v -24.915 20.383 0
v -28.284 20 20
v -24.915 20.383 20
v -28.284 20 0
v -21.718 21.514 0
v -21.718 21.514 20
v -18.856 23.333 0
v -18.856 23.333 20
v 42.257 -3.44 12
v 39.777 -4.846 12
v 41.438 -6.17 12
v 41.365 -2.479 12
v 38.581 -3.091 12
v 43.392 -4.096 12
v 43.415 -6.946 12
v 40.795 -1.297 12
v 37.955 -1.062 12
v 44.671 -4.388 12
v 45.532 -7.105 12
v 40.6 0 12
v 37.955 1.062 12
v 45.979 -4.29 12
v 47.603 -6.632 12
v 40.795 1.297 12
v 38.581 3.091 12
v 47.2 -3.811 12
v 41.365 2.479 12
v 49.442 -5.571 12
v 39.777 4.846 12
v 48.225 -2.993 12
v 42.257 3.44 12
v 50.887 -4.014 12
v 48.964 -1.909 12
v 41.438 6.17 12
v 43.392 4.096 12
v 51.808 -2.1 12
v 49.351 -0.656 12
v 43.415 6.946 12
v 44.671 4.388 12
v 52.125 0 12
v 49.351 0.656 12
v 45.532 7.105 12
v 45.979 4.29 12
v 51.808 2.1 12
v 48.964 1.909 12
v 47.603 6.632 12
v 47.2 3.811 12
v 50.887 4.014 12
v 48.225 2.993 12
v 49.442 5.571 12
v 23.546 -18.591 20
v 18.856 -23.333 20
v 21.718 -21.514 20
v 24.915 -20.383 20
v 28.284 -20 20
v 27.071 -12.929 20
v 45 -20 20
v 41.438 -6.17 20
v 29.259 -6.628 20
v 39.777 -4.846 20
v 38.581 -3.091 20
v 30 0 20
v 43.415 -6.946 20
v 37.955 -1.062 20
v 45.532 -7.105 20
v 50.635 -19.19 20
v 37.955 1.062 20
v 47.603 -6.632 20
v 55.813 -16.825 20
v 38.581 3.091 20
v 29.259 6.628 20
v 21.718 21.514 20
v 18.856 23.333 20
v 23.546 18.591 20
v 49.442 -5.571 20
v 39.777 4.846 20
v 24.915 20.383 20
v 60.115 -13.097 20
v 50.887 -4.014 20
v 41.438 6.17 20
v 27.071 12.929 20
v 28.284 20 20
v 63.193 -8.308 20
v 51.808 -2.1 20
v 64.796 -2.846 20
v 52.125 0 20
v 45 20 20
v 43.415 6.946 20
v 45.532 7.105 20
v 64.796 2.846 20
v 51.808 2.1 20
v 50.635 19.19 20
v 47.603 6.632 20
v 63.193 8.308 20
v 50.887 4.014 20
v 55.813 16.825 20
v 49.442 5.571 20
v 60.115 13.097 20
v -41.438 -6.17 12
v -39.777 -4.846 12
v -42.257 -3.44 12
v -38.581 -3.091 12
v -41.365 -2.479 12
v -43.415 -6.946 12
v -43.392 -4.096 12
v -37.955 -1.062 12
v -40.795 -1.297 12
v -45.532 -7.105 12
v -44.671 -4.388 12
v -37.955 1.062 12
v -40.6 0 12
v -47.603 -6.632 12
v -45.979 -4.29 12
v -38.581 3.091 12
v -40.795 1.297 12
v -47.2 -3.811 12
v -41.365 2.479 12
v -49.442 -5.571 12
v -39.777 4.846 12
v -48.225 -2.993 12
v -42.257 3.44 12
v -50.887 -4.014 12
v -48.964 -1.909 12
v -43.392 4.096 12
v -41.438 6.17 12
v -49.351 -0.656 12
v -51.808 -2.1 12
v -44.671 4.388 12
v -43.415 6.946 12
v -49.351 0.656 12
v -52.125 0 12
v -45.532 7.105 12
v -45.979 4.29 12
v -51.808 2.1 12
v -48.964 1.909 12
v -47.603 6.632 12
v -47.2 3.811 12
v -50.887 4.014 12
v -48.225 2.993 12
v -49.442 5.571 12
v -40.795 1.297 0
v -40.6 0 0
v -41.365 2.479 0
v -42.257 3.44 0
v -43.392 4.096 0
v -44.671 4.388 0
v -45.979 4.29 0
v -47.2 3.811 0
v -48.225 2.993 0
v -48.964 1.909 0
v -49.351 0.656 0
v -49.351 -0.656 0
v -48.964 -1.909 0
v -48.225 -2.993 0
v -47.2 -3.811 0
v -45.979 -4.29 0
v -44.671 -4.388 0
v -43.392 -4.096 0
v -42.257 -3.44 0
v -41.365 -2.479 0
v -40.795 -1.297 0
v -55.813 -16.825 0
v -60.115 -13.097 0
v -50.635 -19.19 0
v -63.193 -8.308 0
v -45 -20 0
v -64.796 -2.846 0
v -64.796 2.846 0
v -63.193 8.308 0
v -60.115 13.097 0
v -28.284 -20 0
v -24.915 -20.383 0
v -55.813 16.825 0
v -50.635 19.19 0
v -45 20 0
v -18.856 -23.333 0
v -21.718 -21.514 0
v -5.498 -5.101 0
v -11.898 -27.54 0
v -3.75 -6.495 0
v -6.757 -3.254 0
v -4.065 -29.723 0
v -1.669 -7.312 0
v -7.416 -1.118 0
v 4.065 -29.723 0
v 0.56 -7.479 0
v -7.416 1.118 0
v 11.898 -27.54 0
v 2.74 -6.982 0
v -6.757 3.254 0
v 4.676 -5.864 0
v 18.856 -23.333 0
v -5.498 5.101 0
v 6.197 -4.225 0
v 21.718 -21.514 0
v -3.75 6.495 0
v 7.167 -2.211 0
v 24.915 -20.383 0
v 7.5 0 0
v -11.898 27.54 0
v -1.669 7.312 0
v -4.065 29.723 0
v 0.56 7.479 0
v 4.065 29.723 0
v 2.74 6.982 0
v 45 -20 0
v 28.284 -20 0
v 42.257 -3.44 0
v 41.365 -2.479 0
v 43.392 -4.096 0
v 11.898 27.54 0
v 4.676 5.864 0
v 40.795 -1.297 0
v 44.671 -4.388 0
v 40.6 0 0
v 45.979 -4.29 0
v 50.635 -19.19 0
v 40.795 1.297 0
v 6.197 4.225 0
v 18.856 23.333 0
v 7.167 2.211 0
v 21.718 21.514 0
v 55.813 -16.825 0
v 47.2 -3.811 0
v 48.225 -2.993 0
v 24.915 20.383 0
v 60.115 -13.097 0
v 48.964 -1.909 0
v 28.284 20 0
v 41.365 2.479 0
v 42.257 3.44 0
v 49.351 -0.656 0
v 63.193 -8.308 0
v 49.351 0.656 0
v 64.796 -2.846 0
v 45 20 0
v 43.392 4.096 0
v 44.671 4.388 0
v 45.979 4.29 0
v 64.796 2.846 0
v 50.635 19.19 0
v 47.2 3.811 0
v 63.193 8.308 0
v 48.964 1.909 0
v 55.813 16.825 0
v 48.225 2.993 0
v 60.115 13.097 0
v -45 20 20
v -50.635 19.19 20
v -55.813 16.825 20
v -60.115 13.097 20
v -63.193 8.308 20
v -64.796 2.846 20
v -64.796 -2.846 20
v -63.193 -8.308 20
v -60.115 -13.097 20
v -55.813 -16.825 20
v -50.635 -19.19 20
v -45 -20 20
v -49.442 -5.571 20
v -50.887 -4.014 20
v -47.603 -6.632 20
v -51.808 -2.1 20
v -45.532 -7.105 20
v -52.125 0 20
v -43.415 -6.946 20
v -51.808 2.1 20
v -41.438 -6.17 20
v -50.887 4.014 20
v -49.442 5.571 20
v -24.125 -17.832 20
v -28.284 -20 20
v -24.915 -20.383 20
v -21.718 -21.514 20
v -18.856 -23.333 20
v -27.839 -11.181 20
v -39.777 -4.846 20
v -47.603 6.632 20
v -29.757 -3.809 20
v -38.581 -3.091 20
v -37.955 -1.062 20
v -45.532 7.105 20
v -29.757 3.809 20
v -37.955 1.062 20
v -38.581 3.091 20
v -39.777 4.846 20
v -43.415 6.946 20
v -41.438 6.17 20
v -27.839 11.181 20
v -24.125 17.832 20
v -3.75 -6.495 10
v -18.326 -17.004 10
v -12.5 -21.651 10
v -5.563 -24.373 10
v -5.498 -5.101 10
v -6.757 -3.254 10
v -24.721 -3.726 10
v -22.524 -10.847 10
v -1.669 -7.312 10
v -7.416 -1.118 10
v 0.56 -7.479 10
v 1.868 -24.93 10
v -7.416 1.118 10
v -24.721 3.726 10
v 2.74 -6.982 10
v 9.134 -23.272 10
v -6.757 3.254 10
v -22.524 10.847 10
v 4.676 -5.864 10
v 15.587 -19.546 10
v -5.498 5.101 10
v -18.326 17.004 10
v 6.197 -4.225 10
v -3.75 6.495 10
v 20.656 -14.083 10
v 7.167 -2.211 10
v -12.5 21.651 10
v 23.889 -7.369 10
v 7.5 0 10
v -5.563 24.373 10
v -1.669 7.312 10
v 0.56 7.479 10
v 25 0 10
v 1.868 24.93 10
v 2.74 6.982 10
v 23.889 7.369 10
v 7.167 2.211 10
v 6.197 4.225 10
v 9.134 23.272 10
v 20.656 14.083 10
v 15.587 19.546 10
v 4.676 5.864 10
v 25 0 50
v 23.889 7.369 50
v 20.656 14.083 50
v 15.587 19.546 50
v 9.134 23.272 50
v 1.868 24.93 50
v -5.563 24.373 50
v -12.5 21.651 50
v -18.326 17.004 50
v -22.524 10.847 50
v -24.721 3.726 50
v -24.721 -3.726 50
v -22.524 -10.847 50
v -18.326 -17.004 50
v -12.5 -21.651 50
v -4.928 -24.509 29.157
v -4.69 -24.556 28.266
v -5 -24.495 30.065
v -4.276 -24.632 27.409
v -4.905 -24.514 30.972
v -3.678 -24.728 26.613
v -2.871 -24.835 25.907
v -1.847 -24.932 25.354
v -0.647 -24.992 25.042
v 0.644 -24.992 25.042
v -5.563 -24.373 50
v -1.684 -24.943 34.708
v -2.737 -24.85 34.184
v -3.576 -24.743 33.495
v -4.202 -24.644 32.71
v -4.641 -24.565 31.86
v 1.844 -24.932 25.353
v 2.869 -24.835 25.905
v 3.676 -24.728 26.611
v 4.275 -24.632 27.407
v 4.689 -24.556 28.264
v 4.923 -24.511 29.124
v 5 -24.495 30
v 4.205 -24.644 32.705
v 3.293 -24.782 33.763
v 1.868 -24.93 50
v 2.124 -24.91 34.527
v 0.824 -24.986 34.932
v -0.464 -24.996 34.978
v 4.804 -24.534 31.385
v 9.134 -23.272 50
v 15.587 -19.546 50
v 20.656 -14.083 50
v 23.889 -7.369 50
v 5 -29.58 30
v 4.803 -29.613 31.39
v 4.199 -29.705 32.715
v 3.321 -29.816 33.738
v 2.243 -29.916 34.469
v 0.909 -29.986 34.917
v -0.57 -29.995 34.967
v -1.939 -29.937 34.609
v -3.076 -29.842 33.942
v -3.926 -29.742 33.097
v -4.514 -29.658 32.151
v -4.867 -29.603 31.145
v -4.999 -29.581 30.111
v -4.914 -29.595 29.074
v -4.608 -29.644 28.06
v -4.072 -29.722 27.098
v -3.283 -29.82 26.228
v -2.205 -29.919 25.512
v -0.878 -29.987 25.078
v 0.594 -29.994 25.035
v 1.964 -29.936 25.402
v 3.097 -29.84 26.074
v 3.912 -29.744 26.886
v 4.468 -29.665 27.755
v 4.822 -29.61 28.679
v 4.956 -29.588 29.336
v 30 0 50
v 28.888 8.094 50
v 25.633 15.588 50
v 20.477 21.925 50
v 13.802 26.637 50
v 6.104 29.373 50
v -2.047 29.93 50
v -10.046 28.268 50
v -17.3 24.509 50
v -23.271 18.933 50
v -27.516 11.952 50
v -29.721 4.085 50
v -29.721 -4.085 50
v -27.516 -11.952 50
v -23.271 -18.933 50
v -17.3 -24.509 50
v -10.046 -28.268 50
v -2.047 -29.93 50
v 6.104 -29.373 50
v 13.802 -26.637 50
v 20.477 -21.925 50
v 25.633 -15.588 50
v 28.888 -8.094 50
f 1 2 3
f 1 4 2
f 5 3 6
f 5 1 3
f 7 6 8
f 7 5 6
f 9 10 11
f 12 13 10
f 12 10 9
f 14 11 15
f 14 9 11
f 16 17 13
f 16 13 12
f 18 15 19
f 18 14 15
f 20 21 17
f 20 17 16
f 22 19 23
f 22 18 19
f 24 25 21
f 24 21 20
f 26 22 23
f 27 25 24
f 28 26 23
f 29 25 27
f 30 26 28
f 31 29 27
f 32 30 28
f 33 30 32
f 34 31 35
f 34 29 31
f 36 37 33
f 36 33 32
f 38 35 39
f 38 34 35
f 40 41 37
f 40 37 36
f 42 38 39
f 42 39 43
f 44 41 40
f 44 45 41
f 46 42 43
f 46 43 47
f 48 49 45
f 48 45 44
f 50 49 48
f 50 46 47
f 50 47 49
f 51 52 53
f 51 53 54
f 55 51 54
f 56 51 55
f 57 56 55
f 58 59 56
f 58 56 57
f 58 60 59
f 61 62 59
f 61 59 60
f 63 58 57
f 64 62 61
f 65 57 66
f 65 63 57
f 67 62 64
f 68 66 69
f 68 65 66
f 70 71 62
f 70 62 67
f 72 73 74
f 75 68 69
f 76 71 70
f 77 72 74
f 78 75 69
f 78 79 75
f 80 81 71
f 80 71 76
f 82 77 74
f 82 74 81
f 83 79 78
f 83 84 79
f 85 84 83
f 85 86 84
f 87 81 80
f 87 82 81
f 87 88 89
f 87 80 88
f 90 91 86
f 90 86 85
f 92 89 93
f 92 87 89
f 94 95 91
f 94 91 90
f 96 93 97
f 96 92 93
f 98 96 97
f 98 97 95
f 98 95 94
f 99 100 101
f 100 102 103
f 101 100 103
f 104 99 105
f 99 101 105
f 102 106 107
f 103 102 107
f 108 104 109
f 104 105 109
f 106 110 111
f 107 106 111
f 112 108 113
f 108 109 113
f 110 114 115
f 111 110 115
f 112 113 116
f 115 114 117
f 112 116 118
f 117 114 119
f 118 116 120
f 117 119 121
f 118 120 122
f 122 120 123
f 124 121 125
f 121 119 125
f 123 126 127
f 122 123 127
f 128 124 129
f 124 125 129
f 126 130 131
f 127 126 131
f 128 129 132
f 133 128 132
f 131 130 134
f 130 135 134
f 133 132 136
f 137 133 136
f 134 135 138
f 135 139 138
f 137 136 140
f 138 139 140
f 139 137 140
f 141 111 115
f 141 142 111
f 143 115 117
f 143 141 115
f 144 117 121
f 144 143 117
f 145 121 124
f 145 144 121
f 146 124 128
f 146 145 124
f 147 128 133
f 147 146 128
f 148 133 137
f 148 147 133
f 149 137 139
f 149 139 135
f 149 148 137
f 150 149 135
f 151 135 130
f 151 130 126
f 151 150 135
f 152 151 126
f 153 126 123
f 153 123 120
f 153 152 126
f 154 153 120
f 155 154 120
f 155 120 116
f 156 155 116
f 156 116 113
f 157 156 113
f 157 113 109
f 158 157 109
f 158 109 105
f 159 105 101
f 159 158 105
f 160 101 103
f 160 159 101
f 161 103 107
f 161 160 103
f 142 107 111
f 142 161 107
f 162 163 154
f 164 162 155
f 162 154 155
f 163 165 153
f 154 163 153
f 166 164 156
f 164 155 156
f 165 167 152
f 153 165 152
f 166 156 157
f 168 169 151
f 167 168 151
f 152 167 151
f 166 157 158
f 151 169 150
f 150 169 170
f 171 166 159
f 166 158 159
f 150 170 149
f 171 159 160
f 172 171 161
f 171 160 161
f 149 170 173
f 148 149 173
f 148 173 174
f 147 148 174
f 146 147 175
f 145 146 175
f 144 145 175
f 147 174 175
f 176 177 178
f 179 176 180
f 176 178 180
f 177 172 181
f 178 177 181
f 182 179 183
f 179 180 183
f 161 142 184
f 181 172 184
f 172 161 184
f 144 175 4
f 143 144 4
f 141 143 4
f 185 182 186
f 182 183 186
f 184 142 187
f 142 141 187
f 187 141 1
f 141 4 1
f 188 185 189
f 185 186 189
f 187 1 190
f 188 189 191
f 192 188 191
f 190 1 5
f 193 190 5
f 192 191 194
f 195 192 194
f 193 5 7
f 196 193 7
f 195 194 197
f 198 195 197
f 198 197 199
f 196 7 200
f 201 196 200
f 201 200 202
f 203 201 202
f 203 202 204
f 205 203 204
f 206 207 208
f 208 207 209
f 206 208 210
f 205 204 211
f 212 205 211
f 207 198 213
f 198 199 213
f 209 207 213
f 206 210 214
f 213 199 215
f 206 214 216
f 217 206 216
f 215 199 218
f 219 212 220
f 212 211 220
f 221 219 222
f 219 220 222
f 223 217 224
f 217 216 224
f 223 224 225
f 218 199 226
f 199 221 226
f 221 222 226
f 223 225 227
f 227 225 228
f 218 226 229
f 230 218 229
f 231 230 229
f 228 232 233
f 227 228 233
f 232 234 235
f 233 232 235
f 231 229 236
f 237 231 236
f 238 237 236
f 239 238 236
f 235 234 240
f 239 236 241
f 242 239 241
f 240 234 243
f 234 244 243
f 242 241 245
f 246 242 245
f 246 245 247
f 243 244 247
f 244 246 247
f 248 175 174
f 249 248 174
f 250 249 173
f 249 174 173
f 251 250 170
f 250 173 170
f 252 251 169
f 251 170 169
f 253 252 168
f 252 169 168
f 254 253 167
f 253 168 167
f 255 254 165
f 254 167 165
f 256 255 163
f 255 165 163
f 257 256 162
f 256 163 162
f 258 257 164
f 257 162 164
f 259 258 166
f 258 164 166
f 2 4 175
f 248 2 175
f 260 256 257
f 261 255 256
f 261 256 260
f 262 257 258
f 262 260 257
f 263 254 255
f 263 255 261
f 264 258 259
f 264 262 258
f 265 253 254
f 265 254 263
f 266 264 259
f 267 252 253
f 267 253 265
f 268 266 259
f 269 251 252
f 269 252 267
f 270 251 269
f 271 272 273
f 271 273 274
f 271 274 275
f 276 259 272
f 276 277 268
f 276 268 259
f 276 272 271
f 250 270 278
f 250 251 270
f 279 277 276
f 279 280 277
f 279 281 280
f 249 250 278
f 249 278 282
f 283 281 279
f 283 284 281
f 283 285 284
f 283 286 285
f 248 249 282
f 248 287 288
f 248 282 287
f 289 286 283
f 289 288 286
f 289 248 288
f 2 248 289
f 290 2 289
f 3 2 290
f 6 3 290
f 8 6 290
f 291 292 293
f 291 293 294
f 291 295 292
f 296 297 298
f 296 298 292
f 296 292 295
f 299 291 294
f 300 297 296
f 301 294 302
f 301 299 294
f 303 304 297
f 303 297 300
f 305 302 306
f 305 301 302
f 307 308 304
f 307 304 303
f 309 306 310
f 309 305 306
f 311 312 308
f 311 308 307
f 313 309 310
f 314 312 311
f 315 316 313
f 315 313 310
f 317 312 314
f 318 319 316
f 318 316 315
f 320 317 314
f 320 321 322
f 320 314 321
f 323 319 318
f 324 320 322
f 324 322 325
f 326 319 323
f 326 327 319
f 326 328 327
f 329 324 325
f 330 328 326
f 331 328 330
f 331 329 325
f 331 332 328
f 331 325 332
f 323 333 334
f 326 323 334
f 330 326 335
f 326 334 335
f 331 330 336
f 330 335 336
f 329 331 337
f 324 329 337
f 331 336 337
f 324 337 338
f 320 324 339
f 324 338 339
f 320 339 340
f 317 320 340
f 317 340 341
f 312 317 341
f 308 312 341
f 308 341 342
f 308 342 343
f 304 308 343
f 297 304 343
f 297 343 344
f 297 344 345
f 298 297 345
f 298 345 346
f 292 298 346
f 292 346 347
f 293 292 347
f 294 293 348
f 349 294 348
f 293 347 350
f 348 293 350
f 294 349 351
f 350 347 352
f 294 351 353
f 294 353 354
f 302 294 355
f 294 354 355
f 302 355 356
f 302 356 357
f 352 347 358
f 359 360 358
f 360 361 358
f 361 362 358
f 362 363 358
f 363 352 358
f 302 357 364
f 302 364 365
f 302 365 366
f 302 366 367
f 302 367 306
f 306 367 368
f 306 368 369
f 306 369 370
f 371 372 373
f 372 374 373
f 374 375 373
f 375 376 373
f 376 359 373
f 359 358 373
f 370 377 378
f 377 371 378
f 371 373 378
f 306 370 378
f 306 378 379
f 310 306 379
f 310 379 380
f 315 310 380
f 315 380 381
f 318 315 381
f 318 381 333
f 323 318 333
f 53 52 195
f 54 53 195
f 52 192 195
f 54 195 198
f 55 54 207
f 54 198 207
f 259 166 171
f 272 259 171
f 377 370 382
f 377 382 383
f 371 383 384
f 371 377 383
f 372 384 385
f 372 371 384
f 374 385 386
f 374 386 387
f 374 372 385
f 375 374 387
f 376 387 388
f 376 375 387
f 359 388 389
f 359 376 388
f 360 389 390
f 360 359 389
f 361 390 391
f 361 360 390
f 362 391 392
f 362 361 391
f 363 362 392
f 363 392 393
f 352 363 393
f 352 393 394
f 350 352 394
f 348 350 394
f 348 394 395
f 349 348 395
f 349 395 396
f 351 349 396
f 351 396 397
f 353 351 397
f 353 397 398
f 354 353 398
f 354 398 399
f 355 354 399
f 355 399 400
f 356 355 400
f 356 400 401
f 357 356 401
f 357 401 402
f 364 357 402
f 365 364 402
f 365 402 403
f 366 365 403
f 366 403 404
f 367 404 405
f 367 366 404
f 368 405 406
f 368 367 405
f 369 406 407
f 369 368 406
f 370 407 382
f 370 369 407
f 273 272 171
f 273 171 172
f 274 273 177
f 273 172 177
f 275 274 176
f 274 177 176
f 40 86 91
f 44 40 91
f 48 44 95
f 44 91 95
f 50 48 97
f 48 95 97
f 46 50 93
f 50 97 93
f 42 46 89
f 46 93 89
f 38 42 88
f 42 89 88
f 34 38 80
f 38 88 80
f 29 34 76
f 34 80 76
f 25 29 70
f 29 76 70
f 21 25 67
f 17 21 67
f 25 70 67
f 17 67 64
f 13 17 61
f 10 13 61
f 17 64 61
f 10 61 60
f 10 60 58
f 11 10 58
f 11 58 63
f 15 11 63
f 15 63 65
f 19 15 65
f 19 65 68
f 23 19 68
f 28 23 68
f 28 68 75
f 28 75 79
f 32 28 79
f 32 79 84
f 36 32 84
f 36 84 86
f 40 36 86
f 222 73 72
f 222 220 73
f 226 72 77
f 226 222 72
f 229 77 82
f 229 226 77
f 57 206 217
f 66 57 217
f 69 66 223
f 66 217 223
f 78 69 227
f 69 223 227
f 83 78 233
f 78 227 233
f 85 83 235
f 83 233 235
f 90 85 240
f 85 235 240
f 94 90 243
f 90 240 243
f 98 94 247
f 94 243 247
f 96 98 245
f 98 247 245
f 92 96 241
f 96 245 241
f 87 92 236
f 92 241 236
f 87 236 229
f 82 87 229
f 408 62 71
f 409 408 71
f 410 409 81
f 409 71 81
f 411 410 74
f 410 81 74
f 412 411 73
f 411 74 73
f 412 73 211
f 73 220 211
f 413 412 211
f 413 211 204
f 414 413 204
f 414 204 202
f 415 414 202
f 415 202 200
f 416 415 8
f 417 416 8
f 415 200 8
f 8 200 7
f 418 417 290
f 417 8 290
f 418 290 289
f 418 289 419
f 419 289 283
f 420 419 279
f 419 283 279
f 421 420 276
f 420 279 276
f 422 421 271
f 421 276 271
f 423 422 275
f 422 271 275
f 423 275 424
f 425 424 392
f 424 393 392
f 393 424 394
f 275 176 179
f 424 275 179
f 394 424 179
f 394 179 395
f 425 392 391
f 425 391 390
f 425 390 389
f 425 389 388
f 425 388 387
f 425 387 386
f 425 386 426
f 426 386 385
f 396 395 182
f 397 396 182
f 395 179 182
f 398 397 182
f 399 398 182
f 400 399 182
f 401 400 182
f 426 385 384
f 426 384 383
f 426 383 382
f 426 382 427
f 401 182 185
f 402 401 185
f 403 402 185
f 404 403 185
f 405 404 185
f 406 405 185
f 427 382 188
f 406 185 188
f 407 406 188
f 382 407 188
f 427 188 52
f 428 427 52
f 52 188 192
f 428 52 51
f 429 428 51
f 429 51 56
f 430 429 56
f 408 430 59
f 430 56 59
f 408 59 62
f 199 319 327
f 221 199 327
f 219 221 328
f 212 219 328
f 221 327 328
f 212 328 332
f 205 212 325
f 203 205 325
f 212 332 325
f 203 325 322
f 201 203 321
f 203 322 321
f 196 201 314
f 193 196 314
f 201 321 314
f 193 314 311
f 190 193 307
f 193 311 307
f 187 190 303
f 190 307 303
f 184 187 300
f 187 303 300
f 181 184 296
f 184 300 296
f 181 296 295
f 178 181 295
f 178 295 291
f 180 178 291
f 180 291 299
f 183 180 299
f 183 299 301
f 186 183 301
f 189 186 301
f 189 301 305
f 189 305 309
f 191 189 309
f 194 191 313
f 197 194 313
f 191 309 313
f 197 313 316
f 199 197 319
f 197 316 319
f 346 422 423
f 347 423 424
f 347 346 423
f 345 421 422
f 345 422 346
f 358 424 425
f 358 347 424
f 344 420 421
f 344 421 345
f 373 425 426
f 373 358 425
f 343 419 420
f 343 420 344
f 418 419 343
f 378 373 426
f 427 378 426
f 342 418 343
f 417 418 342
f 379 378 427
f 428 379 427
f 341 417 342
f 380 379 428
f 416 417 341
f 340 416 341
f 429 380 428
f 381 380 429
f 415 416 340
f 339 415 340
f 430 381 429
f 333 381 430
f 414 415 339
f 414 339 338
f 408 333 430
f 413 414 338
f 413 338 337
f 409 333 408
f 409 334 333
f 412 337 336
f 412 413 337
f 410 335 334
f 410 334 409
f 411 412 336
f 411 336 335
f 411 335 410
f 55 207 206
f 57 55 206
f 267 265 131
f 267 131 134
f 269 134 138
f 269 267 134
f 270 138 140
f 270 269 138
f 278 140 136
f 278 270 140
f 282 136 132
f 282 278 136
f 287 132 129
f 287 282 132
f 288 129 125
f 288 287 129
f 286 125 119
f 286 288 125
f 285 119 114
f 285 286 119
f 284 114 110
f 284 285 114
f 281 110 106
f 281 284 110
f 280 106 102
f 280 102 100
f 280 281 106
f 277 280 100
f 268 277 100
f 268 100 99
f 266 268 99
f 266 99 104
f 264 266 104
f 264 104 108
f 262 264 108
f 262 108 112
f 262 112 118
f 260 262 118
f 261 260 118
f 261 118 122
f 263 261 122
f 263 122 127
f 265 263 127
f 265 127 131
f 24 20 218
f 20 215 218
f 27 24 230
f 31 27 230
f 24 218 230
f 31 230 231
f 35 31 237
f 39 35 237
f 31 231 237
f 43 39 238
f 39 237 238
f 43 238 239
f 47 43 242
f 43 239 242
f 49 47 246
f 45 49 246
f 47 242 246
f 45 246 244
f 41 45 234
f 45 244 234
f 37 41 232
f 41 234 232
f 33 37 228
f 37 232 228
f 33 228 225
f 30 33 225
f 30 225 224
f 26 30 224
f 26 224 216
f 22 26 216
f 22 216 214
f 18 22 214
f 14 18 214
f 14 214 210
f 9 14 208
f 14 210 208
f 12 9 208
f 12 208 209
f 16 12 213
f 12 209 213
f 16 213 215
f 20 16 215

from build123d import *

# Parameters (mm, degrees)
F1_DEPTH       = 20
F2_R           = 30
F3_DEPTH       = 50
F4_R           = 25
F5_DEPTH       = 40
F7_D           = 8.8
F7_CBORE_D     = 14.25
F7_CBORE_DEPTH = 8
F8_R           = 5
F9_DEPTH       = 30.001
F10_R          = 7.5
F11_DEPTH      = 10
F12_R          = 15


# Not quite as in the source:
# - a pattern or mirror of a feature is missing from the dataset's text; its kind, count and spacing are read off the source's solid


with BuildPart() as f1:
    # F0 (on Top) → F1 (new body)
    with BuildSketch(Plane.XY):
        with BuildLine():
            Line((-45, -20), (45, -20))
            ThreePointArc((45, -20), (65, 0), (45, 20))
            Line((45, 20), (-45, 20))
            ThreePointArc((-45, 20), (-65, 0), (-45, -20))
        make_face()
    extrude(amount=F1_DEPTH)

    # F2 (on Top) → F3 (join)
    with BuildSketch(Plane.XY):
        Circle(F2_R)
    extrude(amount=F3_DEPTH)

    # F4 (on face) → F5 (cut)
    with BuildSketch(Plane.XY.offset(50)):
        Circle(F4_R)
    extrude(amount=-F5_DEPTH, mode=Mode.SUBTRACT)

    # F7 (through all)
    with Locations(Plane.XY.offset(20)):
        with Locations((45, 0)):
            f7 = CounterBoreHole(F7_D / 2, F7_CBORE_D / 2, F7_CBORE_DEPTH)

    # F7_copies: F7 across plane
    add(f7.mirror(Plane(origin=(0, 0, 0), x_dir=(0, 0, -1), z_dir=(-1, 0, 0))), mode=Mode.SUBTRACT)

    # F8 (on Front) → F9 (cut, through all)
    with BuildSketch(Plane.XZ):
        with Locations((0, 30)):
            Circle(F8_R)
    extrude(amount=F9_DEPTH, mode=Mode.SUBTRACT)

    # F10 (on face) → F11 (cut, through all)
    with BuildSketch(Plane.XY.offset(10)):
        Circle(F10_R)
    extrude(amount=-F11_DEPTH, mode=Mode.SUBTRACT)

    # F12
    f12_edges = [f1.edges().sort_by_distance(p)[0] for p in [
        (-22.36068, -20, 10),
        (22.36068, -20, 10),
        (-22.36068, 20, 10),
        (22.36068, 20, 10),
    ]]
    fillet(f12_edges, radius=F12_R)


solid = f1.part
